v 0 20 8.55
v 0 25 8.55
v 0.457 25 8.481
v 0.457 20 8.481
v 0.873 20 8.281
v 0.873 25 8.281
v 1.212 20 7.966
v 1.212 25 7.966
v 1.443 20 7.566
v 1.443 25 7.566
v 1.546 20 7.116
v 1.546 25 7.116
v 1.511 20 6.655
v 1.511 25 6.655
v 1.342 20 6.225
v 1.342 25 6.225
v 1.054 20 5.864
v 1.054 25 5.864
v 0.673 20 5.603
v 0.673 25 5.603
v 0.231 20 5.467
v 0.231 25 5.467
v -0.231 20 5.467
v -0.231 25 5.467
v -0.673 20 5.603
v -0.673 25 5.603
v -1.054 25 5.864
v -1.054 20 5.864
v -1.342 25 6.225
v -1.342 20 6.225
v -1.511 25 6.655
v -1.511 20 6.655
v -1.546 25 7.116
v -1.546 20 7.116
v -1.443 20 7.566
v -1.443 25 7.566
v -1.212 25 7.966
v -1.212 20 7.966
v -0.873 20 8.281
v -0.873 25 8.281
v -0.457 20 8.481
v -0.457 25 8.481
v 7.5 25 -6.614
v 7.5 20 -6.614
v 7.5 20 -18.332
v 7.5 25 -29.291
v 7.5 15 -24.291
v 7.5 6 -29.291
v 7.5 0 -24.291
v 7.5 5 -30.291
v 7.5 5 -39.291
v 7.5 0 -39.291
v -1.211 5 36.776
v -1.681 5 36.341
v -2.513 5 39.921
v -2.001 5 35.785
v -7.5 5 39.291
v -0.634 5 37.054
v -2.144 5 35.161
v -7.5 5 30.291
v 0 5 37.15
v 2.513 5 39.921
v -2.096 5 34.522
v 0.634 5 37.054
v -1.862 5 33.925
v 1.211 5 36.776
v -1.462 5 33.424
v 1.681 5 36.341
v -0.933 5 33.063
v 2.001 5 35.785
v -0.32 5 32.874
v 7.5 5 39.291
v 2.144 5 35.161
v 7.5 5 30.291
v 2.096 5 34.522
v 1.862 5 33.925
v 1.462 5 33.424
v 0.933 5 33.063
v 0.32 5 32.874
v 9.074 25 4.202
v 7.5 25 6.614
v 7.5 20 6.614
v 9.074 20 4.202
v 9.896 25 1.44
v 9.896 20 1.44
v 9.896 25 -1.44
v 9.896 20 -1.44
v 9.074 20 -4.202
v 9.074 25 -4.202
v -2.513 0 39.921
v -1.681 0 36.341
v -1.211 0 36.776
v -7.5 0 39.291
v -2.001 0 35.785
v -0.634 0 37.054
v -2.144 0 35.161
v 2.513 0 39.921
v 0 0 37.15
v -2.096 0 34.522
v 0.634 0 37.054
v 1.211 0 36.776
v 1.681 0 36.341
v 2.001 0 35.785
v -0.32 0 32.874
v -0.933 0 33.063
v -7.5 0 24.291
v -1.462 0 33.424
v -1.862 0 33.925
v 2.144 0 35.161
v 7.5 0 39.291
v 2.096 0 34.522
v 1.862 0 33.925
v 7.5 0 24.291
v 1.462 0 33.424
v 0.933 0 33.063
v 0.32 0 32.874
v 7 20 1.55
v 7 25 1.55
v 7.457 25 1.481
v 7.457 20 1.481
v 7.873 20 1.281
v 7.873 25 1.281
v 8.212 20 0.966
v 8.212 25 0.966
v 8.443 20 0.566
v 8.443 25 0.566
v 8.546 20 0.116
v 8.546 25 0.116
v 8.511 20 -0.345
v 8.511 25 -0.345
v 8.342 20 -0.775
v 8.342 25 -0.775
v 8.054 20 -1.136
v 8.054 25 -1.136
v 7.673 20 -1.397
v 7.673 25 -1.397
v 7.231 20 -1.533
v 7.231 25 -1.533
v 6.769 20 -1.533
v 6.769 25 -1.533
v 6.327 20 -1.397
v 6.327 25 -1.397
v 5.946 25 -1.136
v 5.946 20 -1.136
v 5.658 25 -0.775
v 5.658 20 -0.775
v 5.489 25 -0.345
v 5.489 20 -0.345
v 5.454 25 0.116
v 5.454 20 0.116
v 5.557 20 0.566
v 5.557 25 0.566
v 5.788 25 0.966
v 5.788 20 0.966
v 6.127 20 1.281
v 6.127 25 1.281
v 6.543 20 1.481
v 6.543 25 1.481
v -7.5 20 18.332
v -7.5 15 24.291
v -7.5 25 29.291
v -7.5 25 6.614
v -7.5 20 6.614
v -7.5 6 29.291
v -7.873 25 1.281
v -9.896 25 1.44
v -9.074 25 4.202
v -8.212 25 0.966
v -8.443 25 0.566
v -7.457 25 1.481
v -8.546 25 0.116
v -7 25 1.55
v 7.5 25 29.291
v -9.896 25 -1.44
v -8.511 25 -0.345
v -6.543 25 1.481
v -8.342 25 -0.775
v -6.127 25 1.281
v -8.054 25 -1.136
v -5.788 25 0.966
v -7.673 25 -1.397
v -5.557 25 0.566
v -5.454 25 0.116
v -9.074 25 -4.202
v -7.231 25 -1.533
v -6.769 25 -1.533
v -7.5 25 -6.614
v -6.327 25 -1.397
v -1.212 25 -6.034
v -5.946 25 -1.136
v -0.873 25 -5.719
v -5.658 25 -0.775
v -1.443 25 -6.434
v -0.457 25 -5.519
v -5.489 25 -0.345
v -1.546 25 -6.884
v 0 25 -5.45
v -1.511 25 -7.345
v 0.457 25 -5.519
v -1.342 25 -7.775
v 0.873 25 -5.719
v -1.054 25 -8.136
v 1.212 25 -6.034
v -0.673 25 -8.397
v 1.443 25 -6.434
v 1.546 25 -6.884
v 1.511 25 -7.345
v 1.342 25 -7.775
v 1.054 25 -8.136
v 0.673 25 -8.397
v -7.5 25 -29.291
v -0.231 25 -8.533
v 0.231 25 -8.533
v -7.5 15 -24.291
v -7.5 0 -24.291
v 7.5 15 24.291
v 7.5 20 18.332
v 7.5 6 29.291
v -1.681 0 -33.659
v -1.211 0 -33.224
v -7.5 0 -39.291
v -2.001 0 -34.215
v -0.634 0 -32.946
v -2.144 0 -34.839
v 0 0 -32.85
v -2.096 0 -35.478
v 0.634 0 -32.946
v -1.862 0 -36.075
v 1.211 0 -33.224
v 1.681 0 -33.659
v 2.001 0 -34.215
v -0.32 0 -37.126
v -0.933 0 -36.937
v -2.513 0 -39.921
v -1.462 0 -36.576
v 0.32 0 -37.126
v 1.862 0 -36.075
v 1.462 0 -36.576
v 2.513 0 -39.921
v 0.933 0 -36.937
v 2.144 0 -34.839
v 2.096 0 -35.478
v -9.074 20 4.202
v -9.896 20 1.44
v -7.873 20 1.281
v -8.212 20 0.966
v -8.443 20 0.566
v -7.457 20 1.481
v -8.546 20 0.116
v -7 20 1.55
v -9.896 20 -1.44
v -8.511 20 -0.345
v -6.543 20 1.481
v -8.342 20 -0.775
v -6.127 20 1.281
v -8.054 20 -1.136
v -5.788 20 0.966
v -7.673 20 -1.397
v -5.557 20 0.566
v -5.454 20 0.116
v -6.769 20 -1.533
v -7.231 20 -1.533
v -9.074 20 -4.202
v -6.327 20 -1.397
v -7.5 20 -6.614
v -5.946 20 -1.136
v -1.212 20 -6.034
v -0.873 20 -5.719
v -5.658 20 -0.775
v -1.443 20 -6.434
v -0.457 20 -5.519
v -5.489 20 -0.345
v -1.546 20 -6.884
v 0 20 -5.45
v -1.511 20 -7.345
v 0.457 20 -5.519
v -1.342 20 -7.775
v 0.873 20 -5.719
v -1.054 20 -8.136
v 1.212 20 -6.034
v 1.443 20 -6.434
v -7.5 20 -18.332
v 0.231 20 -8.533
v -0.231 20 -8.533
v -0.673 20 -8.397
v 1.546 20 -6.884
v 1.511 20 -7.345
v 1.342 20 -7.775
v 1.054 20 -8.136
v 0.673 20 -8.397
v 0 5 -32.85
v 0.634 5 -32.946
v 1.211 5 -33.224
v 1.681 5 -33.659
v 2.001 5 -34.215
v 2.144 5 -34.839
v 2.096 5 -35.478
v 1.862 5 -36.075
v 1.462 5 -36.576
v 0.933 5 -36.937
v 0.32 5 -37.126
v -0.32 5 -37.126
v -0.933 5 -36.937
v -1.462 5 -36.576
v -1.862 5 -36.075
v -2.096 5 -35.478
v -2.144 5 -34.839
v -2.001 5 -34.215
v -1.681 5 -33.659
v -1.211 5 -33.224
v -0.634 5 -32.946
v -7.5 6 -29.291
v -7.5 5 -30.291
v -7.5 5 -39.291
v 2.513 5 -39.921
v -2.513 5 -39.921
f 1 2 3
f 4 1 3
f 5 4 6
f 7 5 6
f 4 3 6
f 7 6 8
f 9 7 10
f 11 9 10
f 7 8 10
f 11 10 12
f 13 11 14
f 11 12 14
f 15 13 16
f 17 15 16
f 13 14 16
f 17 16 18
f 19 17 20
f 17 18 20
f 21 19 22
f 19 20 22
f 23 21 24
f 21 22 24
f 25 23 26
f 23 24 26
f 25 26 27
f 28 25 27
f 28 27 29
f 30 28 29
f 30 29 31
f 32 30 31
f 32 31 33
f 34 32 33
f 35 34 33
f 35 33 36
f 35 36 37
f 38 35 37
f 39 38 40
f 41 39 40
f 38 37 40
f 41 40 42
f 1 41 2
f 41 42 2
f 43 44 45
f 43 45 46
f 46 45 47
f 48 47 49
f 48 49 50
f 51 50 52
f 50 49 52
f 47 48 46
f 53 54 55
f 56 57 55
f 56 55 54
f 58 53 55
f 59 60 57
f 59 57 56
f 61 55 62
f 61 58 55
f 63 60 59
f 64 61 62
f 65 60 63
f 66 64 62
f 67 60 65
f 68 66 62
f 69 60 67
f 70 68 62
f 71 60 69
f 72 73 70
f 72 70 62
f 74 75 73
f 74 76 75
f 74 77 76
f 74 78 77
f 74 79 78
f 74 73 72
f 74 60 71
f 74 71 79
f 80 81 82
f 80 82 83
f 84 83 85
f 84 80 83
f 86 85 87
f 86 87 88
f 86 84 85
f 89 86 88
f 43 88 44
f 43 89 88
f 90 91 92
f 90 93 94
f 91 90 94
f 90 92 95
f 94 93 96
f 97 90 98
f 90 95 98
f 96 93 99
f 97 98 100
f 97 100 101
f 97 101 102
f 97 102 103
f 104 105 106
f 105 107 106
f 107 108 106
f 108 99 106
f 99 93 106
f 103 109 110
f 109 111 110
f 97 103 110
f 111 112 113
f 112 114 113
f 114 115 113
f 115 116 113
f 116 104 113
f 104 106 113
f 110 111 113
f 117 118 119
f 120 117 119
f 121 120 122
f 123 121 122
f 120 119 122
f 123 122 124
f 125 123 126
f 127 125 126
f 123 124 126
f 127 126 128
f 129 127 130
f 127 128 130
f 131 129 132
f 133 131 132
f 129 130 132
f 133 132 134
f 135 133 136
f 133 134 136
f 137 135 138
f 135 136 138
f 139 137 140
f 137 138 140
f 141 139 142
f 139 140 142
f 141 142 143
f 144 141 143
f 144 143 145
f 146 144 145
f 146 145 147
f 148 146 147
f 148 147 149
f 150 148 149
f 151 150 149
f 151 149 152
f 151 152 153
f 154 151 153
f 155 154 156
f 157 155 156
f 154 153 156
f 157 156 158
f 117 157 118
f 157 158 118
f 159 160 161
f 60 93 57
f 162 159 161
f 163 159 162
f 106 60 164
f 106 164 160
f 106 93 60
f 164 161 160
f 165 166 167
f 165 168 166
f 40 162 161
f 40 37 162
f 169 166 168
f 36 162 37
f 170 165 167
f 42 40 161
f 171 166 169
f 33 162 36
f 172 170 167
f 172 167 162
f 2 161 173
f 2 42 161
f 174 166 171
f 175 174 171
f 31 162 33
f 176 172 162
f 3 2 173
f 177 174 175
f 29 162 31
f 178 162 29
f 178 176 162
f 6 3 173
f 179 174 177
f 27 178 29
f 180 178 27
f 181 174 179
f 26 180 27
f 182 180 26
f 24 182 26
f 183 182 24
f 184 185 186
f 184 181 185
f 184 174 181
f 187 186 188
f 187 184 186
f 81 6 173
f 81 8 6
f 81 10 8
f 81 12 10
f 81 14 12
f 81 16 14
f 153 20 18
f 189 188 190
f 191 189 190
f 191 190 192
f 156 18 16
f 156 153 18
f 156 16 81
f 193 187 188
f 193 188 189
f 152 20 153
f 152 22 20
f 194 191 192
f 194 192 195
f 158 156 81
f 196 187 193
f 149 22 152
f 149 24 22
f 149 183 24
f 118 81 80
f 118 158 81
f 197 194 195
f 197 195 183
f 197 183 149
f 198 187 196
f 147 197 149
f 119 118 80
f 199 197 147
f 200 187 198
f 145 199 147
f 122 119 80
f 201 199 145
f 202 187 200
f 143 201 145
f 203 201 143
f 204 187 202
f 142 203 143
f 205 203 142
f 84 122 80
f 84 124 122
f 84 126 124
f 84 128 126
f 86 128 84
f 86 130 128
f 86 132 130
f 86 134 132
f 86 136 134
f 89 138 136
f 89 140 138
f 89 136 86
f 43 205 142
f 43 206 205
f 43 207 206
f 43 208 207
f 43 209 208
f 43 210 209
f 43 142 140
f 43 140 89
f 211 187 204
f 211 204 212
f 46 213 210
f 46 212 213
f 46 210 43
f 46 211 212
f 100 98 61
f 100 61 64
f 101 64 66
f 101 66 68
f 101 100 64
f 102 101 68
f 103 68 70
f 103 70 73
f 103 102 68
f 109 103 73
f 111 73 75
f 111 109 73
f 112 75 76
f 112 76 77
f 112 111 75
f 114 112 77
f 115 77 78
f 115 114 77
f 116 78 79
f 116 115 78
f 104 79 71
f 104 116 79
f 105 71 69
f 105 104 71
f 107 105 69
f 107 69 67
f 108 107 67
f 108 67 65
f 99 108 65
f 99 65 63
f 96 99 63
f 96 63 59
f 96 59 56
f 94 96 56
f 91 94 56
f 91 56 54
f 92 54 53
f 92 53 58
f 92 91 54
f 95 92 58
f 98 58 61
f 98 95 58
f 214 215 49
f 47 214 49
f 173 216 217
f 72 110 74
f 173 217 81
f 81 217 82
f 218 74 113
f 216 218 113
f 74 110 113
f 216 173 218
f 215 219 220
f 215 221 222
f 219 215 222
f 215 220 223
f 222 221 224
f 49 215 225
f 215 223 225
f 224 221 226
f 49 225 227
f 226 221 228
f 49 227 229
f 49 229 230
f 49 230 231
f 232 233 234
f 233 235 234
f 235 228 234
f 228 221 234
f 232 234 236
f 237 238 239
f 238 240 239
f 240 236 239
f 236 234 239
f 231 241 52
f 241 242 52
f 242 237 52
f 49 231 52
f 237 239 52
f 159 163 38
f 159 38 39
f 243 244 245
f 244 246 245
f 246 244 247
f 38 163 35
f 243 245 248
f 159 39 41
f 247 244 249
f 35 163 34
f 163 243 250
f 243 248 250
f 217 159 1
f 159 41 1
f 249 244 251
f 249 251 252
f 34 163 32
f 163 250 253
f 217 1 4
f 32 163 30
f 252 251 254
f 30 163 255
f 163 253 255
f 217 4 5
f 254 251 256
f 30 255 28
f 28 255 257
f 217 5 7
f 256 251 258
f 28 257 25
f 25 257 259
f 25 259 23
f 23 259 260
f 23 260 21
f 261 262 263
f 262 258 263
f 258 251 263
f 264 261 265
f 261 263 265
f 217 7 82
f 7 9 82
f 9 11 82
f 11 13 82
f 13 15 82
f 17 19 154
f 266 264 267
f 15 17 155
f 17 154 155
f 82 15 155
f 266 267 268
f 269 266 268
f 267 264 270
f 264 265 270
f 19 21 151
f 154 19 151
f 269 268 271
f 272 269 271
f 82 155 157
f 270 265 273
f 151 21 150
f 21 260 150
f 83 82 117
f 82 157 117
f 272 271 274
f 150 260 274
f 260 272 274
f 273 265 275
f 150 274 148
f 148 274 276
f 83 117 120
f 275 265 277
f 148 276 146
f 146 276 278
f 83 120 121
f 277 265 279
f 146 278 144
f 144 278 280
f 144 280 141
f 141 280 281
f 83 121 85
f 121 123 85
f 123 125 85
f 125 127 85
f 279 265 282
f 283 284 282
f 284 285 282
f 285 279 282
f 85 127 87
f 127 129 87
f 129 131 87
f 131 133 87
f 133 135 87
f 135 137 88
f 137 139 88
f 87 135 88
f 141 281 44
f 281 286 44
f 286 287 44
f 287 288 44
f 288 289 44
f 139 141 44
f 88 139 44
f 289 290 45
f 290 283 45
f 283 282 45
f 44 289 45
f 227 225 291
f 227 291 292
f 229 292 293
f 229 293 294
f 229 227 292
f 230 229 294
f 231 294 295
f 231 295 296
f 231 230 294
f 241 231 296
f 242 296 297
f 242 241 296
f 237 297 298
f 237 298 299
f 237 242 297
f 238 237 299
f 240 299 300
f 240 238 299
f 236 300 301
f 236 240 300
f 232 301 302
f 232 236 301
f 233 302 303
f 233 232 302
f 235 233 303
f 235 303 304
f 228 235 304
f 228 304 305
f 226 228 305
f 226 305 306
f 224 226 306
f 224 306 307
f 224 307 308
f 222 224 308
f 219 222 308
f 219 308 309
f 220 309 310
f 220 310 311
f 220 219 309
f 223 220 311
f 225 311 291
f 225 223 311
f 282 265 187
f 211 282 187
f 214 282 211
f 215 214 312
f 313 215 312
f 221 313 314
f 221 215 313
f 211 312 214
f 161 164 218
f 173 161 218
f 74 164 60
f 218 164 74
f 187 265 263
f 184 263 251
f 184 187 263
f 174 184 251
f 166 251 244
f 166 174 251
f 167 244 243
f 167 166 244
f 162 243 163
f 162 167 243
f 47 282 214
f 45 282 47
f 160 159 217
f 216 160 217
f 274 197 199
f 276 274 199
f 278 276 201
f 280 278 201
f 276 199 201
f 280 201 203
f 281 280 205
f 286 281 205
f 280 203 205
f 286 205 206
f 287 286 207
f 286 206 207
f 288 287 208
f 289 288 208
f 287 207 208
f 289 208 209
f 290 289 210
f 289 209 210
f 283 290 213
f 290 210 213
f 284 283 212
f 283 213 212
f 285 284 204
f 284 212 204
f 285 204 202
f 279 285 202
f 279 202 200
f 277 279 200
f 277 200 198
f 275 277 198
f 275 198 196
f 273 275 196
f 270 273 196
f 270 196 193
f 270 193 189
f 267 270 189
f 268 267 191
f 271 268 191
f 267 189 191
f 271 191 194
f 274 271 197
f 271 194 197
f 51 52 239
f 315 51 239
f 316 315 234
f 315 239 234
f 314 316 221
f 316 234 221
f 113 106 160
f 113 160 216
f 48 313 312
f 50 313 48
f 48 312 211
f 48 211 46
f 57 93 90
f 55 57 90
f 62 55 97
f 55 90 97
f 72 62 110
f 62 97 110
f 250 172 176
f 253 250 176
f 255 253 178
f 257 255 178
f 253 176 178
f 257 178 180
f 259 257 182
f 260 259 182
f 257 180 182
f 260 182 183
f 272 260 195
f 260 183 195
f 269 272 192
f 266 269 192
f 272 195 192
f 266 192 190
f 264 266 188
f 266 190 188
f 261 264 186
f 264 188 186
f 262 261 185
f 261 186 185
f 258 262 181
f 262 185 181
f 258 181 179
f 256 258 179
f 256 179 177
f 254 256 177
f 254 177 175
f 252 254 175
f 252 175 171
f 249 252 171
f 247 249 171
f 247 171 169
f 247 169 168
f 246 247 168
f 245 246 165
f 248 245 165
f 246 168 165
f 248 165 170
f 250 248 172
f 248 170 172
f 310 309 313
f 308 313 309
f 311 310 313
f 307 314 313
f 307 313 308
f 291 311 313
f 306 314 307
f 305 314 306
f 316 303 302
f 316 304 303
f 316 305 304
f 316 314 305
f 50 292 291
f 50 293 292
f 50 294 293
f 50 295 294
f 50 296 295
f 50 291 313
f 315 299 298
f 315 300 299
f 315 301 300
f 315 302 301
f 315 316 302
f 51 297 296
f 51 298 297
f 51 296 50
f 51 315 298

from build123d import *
from OCP.BRepFilletAPI import BRepFilletAPI_MakeChamfer

# Parameters (mm, degrees)
SKETCH1_R             = 2.15
BOSS_EXTRUDE1_DEPTH   = 5
BOSS_EXTRUDE1_2_DEPTH = 5
SKETCH2_W             = 15
SKETCH2_H             = 5
BOSS_EXTRUDE2_DEPTH   = 15
SKETCH3_W             = 15
SKETCH3_H             = 58.581168228
BOSS_EXTRUDE3_DEPTH   = 5
SKETCH4_R             = 10
BOSS_EXTRUDE4_DEPTH   = 5
SKETCH5_R             = 1.55
CUT_EXTRUDE1_DEPTH    = 5
CHAMFER2_SIZE         = 5
CHAMFER2_SIZE2        = 5.958767963
CHAMFER3_SIZE         = 1


with BuildPart() as part:
    # Sketch1 → Boss-Extrude1 (new body)
    with BuildSketch(Plane(origin=(0, 0, 0), x_dir=(1, 0, 0), z_dir=(0, 1, 0))):
        with BuildLine():
            Line((-7.5, -24.290584114), (-7.5, -39.290584114))
            ThreePointArc((-7.5, -39.290584114), (0, -40), (7.5, -39.290584114))
            Line((7.5, -39.290584114), (7.5, -24.290584114))
            Line((7.5, -24.290584114), (-7.5, -24.290584114))
        make_face()
        with Locations(Location((0, -35, 0), (0, 0, 270))):
            Circle(SKETCH1_R, mode=Mode.SUBTRACT)
    extrude(amount=BOSS_EXTRUDE1_DEPTH)



with BuildPart() as body_2:
    # Sketch1 → Boss-Extrude1 2 (new body)
    with BuildSketch(Plane(origin=(0, 0, 0), x_dir=(1, 0, 0), z_dir=(0, 1, 0))):
        with BuildLine():
            Line((-7.5, 39.290584114), (-7.5, 24.290584114))
            Line((-7.5, 24.290584114), (7.5, 24.290584114))
            Line((7.5, 24.290584114), (7.5, 39.290584114))
            ThreePointArc((7.5, 39.290584114), (0, 40), (-7.5, 39.290584114))
        make_face()
        with Locations(Location((0, 35, 0), (0, 0, 270))):
            Circle(SKETCH1_R, mode=Mode.SUBTRACT)
    extrude(amount=BOSS_EXTRUDE1_2_DEPTH)


with BuildPart() as part_1:
    add(part.part)

    add(body_2.part)  # Boss-Extrude2 merges body 2
    # Sketch2 → Boss-Extrude2 (add)
    with BuildSketch(Plane(origin=(0, 5, 0), x_dir=(1, 0, 0), z_dir=(0, 1, 0))):
        with Locations((0, -26.790584114)):
            Rectangle(SKETCH2_W, SKETCH2_H)
        with Locations((0, 26.790584114)):
            Rectangle(SKETCH2_W, SKETCH2_H)
    extrude(amount=BOSS_EXTRUDE2_DEPTH)

    # Sketch3 → Boss-Extrude3 (add)
    with BuildSketch(Plane(origin=(0, 20, 0), x_dir=(1, 0, 0), z_dir=(0, 1, 0))):
        Rectangle(SKETCH3_W, SKETCH3_H)
    extrude(amount=BOSS_EXTRUDE3_DEPTH)

    # Sketch4 → Boss-Extrude4 (add)
    with BuildSketch(Plane(origin=(0, 25, 0), x_dir=(1, 0, 0), z_dir=(0, 1, 0))):
        Circle(SKETCH4_R)
    extrude(amount=-BOSS_EXTRUDE4_DEPTH)

    # Sketch5 → Cut-Extrude1 (cut)
    with BuildSketch(Plane(origin=(0, 25, 0), x_dir=(1, 0, 0), z_dir=(0, 1, 0))):
        with Locations(Location((0, 7, 0), (0, 0, 270))):
            Circle(SKETCH5_R)
        with Locations(Location((7, 0, 0), (0, 0, 270))):
            Circle(SKETCH5_R)
        with Locations(Location((0, -7, 0), (0, 0, 270))):
            Circle(SKETCH5_R)
        with Locations(Location((-7, 0, 0), (0, 0, 270))):
            Circle(SKETCH5_R)
    extrude(amount=-CUT_EXTRUDE1_DEPTH, mode=Mode.SUBTRACT)

    # Chamfer2: one chamfer whose edges measure the first distance from different faces: ONE call of the kernel's chamfer builder (chamfer() names one face for all edges)
    chamfer2_edges_1 = [part_1.edges().sort_by_distance(p)[0] for p in [
        (0, 20, -24.290584114),
    ]]
    chamfer2_side_1 = [part_1.faces().sort_by_distance(p)[0] for p in [
        (0, 10, -24.290584114),
    ]]
    chamfer2_edges_2 = [part_1.edges().sort_by_distance(p)[0] for p in [
        (0, 20, 24.290584114),
    ]]
    chamfer2_side_2 = [part_1.faces().sort_by_distance(p)[0] for p in [
        (0, 10, 24.290584114),
    ]]
    chamfer2 = BRepFilletAPI_MakeChamfer(part_1.part.solid().wrapped)
    for e in chamfer2_edges_1:
        chamfer2.Add(CHAMFER2_SIZE, CHAMFER2_SIZE2, e.wrapped, chamfer2_side_1[0].wrapped)  # the first distance lies on this face
    for e in chamfer2_edges_2:
        chamfer2.Add(CHAMFER2_SIZE, CHAMFER2_SIZE2, e.wrapped, chamfer2_side_2[0].wrapped)  # the first distance lies on this face
    add(Compound.cast(chamfer2.Shape()), mode=Mode.REPLACE)

    # Chamfer3
    chamfer3_edges = [part_1.edges().sort_by_distance(p)[0] for p in [
        (0, 5, -29.290584114),
        (0, 5, 29.290584114),
    ]]
    chamfer(chamfer3_edges, length=CHAMFER3_SIZE)


solid = part_1.part
